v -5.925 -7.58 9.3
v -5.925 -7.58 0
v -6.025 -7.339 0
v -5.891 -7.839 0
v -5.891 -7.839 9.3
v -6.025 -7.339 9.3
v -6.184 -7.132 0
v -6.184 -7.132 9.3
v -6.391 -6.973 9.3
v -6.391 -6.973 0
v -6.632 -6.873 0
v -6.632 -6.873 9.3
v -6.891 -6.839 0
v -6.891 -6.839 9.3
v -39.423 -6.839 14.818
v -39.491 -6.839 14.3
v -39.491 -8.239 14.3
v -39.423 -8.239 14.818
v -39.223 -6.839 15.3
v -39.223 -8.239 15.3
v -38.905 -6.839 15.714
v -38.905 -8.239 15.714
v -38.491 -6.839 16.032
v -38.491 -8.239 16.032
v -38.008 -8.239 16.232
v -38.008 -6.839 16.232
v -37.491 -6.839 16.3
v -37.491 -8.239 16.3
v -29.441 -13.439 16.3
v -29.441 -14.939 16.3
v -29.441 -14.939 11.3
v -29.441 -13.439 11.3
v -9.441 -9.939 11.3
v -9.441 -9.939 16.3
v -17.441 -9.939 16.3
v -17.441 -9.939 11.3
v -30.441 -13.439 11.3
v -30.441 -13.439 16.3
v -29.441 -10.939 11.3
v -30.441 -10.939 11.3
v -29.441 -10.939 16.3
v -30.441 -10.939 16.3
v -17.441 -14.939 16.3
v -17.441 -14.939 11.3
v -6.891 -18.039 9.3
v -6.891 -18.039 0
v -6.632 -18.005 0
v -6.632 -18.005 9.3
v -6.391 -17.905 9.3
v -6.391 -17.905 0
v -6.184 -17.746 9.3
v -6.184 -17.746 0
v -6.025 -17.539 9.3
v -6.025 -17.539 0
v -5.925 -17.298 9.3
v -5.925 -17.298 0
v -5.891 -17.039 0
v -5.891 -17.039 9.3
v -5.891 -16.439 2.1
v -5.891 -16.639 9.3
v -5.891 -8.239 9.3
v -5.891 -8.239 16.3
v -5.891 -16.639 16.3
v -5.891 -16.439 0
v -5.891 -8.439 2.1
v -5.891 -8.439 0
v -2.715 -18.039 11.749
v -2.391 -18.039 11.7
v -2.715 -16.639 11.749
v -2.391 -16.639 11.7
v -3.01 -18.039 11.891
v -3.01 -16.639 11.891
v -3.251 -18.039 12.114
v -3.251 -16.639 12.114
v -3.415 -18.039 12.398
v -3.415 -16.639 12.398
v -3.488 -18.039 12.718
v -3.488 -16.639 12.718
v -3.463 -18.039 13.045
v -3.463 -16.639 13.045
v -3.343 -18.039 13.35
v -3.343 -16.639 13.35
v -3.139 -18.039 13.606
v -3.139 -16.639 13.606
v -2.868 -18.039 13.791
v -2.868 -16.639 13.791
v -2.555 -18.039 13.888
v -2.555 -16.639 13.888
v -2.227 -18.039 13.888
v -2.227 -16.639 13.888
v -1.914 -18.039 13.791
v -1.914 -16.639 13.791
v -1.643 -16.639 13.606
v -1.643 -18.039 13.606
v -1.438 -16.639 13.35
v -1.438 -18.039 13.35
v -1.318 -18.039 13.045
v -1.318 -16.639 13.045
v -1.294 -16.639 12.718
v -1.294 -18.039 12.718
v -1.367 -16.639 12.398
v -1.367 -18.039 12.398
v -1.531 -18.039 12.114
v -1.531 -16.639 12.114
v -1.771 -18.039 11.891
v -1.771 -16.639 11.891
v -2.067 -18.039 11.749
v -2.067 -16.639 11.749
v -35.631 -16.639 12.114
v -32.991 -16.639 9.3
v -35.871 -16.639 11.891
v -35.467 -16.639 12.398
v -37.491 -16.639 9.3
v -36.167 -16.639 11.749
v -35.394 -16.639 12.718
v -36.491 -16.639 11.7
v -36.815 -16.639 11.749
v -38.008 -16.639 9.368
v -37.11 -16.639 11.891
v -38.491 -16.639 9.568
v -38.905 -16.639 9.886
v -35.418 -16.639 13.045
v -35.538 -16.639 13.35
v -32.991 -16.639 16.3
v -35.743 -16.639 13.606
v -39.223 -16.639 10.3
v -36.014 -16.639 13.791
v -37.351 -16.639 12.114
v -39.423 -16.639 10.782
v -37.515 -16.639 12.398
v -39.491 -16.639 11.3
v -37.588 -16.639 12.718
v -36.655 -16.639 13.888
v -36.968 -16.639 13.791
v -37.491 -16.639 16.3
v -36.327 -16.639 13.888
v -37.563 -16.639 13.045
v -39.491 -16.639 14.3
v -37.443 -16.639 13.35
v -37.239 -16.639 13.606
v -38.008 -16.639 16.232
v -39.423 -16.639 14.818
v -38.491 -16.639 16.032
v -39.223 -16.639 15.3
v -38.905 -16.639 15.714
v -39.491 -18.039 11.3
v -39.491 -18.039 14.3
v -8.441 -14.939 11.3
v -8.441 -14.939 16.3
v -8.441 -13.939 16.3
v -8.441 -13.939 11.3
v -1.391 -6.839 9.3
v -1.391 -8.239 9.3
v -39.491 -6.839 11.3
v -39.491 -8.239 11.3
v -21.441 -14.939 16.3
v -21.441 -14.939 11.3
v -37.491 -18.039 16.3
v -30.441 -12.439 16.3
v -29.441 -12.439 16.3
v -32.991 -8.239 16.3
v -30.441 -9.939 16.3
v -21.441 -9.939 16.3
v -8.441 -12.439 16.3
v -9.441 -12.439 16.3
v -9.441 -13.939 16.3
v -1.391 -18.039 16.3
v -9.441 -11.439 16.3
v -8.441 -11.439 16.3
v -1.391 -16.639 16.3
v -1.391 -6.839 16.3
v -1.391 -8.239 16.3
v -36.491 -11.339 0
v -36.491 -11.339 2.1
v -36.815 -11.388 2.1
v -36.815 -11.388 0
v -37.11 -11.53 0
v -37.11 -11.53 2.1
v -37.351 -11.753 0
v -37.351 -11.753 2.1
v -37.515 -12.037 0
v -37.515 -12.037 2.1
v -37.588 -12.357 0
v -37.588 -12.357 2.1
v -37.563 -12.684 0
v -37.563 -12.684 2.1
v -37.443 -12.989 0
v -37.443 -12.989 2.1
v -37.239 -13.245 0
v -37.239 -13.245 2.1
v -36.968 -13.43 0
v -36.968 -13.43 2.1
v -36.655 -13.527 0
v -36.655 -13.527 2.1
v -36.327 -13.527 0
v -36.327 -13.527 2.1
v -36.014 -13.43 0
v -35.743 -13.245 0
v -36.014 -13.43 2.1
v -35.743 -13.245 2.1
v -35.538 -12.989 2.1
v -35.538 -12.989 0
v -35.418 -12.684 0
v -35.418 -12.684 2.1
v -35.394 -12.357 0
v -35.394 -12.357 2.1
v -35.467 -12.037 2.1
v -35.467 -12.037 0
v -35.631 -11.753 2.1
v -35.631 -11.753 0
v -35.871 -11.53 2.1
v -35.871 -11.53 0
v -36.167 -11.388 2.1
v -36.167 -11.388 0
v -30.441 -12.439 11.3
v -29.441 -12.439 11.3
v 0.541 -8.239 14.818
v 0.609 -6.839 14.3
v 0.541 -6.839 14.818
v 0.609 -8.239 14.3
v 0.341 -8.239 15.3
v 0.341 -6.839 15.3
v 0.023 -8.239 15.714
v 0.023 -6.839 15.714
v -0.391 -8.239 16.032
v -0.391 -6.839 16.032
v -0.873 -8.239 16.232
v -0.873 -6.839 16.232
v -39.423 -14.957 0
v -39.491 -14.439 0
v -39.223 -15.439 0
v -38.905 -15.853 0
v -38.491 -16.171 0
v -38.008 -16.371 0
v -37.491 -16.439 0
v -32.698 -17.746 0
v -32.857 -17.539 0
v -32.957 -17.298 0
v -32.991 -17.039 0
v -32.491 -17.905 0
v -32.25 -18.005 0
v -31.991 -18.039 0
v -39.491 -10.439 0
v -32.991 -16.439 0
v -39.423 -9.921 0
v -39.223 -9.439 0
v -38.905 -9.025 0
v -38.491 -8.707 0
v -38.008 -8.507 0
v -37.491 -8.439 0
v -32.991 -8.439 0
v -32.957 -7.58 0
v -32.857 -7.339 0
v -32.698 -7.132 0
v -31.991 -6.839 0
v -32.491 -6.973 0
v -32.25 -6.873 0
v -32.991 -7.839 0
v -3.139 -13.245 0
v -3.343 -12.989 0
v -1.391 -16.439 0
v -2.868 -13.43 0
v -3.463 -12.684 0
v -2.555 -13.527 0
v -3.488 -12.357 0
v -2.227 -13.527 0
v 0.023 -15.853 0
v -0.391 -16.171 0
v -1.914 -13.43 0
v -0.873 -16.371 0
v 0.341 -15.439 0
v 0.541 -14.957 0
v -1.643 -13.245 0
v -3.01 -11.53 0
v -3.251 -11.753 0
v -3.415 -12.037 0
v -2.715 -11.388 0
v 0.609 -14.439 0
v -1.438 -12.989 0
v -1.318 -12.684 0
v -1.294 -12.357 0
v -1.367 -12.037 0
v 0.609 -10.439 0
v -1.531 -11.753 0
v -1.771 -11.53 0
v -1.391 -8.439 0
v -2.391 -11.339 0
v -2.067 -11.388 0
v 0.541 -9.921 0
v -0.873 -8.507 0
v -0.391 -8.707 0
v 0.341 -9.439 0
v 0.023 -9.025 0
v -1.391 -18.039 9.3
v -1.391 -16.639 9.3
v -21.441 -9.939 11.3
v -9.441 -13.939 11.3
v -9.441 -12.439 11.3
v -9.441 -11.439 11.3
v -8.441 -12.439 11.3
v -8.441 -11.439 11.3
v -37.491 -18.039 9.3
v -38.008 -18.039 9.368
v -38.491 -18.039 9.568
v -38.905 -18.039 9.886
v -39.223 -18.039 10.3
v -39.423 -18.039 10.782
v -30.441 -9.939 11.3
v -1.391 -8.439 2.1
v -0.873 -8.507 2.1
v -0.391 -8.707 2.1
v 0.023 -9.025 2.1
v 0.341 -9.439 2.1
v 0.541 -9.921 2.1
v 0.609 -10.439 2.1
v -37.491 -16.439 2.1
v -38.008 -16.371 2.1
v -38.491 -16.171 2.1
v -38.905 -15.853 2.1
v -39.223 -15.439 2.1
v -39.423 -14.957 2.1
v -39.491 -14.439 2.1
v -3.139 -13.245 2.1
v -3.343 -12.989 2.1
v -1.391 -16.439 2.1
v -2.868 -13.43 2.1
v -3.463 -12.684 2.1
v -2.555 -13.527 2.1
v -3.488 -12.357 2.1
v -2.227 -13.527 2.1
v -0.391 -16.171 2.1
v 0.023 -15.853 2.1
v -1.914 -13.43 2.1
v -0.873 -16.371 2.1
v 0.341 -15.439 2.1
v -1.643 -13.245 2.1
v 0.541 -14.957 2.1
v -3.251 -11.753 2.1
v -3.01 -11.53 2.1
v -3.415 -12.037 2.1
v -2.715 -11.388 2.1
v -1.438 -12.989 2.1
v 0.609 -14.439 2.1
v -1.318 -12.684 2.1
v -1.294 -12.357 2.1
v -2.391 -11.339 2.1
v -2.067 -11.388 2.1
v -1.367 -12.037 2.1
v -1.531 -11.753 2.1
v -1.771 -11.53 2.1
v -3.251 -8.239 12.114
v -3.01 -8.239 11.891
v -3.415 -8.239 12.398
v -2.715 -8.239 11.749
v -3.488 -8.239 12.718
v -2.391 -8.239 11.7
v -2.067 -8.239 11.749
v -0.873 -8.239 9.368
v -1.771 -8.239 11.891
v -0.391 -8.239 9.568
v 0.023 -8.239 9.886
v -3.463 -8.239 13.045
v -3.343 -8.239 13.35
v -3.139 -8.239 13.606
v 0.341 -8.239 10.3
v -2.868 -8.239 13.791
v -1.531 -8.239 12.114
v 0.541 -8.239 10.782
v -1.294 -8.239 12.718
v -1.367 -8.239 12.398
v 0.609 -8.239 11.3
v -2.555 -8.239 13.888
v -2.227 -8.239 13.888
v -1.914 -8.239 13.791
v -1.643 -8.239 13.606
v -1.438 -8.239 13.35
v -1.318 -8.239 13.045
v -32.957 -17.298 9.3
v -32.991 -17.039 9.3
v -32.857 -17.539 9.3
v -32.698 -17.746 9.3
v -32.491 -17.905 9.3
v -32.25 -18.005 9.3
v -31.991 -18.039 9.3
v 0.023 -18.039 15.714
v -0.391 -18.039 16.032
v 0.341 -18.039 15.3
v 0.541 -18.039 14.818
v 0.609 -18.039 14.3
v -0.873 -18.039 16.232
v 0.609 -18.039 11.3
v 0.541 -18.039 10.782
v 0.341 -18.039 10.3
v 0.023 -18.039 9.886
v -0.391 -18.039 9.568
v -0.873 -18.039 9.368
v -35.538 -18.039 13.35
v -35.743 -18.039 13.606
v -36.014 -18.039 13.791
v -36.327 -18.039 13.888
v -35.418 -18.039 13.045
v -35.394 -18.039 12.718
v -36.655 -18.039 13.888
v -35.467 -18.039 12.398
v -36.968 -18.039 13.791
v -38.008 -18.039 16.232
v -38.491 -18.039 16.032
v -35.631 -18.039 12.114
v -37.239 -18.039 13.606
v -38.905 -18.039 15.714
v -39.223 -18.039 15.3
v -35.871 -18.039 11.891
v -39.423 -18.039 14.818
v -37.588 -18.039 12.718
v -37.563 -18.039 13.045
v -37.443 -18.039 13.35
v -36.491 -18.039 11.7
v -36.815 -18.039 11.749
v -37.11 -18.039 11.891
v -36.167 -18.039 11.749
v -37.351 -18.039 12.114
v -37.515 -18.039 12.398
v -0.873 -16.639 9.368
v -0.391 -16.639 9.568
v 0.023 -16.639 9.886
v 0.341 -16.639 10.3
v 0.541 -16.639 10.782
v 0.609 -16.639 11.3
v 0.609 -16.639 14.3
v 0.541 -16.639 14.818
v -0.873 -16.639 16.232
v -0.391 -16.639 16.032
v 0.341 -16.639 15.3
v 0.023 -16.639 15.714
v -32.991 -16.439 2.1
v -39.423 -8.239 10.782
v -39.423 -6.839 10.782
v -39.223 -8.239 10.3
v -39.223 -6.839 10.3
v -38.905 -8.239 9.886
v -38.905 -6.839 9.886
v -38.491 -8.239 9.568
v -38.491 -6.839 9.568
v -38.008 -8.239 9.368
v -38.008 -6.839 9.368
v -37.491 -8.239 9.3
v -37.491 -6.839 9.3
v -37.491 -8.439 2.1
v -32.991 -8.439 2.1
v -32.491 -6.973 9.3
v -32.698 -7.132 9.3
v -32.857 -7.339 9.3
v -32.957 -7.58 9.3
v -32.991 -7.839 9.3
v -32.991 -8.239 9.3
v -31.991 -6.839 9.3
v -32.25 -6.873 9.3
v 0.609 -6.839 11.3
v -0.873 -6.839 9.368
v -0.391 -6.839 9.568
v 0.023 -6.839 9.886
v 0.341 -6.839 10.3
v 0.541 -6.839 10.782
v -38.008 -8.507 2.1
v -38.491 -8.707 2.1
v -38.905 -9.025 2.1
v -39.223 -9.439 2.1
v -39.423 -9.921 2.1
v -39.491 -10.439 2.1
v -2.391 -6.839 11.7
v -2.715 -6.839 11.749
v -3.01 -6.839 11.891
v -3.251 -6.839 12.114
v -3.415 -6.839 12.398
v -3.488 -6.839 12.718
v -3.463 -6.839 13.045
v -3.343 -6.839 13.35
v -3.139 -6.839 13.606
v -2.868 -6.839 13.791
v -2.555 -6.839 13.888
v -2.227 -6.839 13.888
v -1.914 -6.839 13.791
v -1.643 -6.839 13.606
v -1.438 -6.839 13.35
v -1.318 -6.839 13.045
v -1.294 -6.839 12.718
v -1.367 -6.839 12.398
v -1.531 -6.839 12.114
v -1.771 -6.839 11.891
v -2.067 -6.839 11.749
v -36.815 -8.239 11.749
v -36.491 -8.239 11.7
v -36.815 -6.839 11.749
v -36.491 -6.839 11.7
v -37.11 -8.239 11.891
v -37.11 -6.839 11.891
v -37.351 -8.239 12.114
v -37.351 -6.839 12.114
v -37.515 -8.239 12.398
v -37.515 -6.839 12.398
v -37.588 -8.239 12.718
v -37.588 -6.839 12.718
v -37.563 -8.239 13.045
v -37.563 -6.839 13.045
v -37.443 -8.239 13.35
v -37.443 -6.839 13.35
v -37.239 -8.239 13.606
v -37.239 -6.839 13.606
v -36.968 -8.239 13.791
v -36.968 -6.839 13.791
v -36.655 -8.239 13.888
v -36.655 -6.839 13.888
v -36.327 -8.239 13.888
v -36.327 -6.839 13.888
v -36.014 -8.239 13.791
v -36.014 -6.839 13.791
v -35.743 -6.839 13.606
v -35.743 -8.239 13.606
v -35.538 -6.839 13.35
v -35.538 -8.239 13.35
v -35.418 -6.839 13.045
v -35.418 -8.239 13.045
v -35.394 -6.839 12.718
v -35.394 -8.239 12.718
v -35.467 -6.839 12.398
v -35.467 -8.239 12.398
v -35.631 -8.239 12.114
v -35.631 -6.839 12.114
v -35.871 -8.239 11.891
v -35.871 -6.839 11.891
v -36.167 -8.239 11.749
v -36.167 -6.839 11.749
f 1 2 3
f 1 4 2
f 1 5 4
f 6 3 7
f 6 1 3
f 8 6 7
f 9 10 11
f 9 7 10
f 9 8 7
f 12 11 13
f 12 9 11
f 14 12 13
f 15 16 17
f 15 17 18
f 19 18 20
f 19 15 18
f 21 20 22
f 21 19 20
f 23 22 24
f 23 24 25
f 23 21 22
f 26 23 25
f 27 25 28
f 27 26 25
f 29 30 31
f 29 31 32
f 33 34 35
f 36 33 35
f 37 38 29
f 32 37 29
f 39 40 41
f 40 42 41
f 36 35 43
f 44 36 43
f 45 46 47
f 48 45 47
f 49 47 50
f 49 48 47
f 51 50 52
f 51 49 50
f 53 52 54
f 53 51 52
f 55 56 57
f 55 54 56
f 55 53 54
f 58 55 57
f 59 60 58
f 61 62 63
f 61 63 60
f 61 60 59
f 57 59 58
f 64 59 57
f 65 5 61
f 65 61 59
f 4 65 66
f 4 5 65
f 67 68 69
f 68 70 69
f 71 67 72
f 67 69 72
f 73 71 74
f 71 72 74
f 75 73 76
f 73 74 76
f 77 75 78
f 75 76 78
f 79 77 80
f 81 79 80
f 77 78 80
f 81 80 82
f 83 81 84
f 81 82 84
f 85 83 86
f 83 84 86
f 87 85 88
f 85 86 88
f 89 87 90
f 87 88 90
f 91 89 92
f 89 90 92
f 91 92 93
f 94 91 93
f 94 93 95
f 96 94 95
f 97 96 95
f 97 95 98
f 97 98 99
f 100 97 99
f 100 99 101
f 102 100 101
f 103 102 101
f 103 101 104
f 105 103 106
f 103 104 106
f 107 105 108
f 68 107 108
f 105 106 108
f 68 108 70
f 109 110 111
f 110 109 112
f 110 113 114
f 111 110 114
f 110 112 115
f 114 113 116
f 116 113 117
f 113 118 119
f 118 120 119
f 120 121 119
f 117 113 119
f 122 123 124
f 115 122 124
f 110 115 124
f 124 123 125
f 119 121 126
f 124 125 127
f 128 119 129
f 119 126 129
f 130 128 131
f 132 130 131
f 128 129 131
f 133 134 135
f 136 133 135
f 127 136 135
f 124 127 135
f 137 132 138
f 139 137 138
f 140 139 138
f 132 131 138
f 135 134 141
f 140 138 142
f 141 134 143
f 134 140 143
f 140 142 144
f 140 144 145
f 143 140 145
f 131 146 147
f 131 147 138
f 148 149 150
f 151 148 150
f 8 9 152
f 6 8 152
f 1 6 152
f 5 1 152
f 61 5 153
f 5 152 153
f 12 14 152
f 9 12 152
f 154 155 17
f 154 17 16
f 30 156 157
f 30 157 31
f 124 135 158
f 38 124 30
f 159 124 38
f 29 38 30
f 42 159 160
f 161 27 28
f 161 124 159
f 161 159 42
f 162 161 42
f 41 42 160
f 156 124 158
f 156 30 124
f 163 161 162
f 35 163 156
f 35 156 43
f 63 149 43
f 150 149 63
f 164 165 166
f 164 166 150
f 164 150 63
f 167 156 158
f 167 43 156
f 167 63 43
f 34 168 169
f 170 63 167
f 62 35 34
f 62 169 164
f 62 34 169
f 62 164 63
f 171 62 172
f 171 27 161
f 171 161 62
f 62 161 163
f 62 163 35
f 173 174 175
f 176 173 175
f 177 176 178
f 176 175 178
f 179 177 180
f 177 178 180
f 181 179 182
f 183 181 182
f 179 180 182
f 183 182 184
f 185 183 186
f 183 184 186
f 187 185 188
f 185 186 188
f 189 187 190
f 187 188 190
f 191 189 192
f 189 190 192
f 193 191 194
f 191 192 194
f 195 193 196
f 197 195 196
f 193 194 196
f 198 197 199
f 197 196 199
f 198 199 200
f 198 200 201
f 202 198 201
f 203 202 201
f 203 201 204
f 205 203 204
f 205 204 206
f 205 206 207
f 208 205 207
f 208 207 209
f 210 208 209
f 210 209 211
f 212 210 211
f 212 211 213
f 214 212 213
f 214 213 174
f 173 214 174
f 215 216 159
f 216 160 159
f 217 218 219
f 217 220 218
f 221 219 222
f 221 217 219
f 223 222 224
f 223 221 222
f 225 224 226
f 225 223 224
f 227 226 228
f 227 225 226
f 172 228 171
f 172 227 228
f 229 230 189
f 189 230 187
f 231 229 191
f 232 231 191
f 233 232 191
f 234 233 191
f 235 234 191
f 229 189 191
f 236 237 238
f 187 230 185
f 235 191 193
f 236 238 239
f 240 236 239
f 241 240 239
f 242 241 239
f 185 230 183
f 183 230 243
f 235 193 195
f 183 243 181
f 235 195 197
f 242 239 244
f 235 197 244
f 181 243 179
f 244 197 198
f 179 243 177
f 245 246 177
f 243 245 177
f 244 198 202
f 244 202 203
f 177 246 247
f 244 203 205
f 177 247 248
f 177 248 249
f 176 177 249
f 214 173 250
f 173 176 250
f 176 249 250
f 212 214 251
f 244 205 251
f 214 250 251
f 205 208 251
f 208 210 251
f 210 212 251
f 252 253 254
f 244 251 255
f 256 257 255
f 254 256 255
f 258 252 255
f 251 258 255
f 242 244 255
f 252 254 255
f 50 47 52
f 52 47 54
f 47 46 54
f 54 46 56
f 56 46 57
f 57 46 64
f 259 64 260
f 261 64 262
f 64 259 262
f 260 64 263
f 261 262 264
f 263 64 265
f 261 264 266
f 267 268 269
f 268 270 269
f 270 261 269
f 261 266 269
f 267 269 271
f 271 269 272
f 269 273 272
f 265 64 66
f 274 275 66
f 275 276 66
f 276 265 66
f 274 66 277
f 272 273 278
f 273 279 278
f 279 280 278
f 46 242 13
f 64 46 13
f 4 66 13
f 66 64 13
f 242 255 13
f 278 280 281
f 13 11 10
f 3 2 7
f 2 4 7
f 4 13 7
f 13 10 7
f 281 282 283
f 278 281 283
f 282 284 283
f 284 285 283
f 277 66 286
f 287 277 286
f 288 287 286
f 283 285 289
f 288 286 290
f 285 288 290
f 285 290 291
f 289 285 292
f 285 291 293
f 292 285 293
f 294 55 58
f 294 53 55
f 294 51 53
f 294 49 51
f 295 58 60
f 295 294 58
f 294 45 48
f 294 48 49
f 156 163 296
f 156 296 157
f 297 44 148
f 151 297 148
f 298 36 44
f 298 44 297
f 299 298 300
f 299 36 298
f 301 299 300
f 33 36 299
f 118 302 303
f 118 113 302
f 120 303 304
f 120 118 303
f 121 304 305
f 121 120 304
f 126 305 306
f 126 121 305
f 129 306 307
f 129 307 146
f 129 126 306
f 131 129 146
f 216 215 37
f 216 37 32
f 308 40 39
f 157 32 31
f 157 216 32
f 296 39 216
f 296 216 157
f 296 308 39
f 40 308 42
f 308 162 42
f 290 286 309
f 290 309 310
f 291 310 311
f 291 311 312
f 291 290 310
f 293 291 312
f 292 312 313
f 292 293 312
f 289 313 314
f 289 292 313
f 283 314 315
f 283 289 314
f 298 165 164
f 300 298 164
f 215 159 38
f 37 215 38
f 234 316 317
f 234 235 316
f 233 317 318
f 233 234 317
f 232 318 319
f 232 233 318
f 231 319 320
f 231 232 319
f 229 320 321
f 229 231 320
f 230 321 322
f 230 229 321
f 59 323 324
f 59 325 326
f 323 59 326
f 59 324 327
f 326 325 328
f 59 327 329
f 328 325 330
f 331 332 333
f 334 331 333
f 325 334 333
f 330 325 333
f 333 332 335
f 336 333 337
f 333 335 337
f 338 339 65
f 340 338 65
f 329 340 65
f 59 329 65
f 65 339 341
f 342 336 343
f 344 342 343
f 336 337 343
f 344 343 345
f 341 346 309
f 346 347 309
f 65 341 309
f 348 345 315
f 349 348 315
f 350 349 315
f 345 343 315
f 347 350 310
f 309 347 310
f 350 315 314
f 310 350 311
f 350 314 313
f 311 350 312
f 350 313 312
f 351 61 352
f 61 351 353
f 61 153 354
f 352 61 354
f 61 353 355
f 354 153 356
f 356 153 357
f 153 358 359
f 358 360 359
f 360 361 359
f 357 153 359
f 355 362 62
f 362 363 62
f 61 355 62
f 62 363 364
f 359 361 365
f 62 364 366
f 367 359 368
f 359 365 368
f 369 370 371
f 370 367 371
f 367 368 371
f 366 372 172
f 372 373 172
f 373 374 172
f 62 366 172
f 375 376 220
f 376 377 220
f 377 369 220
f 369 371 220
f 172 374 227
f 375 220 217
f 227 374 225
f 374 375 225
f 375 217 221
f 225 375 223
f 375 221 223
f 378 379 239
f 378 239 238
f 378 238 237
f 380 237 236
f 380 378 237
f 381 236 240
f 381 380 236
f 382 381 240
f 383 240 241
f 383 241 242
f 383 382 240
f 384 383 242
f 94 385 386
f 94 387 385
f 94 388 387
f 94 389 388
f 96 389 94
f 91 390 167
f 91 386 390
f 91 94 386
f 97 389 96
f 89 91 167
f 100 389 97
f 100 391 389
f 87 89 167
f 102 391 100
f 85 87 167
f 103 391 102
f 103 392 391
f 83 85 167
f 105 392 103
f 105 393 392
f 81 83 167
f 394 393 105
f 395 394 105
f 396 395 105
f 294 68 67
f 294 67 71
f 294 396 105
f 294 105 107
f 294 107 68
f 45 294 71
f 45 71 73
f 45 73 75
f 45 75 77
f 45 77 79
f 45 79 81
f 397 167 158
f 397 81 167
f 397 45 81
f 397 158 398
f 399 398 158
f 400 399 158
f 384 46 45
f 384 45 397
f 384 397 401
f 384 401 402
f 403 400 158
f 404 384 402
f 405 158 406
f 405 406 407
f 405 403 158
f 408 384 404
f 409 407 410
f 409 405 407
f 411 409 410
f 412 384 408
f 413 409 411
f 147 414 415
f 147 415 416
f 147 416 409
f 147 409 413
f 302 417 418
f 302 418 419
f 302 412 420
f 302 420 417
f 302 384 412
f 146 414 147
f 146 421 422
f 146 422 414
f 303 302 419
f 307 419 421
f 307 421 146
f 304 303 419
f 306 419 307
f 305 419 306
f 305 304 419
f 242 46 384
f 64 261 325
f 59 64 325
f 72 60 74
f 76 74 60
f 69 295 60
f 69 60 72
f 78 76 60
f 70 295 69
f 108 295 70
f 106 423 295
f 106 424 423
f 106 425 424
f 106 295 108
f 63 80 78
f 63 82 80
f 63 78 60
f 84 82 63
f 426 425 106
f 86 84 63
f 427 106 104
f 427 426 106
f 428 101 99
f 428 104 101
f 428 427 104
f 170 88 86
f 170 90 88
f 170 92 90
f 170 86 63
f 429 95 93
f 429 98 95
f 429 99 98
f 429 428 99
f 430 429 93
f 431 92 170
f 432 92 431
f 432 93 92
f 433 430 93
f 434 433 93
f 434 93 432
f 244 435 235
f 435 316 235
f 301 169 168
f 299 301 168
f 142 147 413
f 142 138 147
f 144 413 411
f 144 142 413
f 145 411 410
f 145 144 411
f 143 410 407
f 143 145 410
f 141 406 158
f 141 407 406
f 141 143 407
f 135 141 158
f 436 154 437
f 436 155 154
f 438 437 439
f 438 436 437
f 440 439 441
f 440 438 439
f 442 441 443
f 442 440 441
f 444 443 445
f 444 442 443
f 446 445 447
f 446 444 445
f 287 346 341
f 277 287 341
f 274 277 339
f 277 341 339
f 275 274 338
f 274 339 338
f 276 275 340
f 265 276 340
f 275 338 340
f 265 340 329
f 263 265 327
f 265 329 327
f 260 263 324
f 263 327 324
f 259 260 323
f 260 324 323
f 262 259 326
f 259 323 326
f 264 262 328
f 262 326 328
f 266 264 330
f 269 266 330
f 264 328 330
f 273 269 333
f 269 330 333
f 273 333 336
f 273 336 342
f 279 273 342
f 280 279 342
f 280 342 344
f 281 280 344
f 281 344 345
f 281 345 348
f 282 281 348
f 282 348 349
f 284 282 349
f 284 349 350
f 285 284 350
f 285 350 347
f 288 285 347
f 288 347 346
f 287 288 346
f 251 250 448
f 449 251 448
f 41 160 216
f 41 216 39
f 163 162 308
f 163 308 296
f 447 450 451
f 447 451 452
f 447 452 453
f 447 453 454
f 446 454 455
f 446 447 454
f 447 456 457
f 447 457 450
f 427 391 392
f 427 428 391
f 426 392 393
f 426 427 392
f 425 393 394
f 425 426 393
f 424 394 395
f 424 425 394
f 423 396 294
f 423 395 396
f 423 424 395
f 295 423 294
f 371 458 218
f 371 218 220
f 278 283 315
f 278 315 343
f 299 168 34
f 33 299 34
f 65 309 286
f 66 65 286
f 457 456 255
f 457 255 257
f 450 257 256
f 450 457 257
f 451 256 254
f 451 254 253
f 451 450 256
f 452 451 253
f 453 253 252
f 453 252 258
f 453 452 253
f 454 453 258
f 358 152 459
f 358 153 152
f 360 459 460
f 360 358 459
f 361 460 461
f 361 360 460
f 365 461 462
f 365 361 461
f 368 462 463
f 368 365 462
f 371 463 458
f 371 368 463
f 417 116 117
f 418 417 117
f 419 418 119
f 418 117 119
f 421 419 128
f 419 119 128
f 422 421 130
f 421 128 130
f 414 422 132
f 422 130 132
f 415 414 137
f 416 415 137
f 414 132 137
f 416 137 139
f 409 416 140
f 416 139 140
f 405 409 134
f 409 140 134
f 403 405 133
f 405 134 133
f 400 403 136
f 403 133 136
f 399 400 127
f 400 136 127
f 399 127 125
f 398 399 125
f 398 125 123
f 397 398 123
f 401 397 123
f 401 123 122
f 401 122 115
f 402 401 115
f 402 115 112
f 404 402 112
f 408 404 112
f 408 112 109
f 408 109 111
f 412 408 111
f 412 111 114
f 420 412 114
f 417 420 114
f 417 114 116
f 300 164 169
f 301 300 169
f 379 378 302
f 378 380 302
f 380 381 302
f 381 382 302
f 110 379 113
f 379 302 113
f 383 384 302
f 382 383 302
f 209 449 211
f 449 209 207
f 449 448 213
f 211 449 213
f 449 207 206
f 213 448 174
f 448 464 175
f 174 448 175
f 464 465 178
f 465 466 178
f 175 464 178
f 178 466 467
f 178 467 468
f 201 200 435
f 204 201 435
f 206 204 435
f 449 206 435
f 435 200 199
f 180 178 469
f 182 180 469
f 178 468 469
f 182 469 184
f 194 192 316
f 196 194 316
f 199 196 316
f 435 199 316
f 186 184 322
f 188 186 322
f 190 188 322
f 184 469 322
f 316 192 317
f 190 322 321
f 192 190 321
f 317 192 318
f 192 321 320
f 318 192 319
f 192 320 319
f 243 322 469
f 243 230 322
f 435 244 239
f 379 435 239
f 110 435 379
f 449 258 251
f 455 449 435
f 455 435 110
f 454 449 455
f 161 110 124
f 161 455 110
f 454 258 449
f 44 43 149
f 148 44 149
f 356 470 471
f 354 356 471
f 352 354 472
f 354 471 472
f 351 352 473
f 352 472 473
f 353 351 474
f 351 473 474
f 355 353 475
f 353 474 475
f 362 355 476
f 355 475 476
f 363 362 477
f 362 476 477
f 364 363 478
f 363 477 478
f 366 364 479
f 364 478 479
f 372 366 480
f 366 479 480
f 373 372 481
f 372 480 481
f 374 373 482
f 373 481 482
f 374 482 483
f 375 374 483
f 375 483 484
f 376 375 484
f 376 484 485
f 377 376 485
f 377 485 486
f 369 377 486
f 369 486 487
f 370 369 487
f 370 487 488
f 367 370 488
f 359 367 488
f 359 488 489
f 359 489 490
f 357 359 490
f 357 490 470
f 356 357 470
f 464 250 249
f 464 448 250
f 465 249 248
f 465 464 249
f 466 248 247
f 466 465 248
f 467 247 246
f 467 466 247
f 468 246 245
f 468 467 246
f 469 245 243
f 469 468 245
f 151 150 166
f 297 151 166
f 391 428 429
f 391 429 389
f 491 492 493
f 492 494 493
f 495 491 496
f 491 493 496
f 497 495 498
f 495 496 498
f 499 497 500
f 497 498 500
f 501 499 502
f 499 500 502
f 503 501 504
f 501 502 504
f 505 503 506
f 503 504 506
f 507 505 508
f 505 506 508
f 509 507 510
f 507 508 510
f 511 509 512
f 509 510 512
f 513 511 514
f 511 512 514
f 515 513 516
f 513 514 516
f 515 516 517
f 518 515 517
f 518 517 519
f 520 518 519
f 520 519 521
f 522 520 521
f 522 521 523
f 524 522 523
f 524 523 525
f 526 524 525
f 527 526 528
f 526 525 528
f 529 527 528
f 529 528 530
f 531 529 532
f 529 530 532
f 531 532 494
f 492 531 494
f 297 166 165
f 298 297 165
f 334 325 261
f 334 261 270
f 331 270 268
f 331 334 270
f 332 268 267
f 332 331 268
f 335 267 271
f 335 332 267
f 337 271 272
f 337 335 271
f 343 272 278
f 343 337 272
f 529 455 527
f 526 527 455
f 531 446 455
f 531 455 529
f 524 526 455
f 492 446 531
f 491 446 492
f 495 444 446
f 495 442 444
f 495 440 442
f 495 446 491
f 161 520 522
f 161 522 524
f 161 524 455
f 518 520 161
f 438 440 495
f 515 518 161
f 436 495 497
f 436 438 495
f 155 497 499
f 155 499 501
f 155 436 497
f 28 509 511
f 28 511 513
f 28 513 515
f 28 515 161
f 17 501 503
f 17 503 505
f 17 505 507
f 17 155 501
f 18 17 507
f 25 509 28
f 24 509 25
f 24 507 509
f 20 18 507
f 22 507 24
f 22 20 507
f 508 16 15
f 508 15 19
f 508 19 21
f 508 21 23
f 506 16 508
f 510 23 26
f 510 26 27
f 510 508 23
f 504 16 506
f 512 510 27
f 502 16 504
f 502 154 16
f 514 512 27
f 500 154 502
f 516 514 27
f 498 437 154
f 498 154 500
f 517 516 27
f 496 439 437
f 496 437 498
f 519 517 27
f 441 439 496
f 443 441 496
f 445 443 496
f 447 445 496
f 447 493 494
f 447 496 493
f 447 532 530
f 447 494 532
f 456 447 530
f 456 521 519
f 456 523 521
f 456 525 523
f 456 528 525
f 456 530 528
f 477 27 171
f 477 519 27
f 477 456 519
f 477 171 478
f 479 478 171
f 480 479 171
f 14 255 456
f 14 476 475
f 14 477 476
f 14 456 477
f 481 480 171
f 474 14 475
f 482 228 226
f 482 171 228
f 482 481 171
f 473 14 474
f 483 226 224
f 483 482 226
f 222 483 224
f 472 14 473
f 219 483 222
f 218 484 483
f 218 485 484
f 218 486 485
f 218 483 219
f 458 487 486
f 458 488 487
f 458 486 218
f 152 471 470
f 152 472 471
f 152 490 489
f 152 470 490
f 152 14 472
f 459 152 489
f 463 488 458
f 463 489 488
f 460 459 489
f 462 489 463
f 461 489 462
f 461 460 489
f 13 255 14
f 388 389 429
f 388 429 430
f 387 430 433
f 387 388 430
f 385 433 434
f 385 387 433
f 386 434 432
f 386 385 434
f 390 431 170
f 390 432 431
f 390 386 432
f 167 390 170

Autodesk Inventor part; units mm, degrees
ref_plane "YZ Plane" through (0, 0, 0) normal (1, 0, 0) x (0, 1, 0)
ref_plane "XZ Plane" through (0, 0, 0) normal (0, 1, 0) x (-1, 0, 0)
ref_plane "XY Plane" through (0, 0, 0) normal (0, 0, 1) x (1, 0, 0)
sketch "スケッチ1" plane through (0, 0, 0) normal (0, 0, 1) x (1, 0, 0)
  line L0 (-39.4908, -6.839) -> (0.6092, -6.839)
  line L1 (0.6092, -6.839) -> (0.6092, -18.039)
  line L2 (0.6092, -18.039) -> (-39.4908, -18.039)
  line L3 (-39.4908, -18.039) -> (-39.4908, -6.839)
  point P0 (0, 0)
  dimension "d0" = 40.1
  dimension "d1" = 11.2
extrude "押し出し1" add sketch "スケッチ1" along normal blind 16.3
sketch "スケッチ2" plane through (0.6092, -18.039, 0) normal (1, 0, 0) x (0, 0, -1)
  line L0 (-16.3, 11.2) -> (-16.3, 0) projected
  line L1 (0, 0) -> (-16.3, 0) projected
  line L2 (0, 11.2) -> (0, 0) projected
  line L3 (0, 11.2) -> (-16.3, 11.2) projected
  line L4 (-16.3, 0) -> (-9.3, 0)
  line L5 (-9.3, 0) -> (-9.3, 1.4)
  line L6 (-9.3, 1.4) -> (-16.3, 1.4)
  line L7 (-16.3, 1.4) -> (-16.3, 0)
  line L8 (-16.3, 11.2) -> (-9.3, 11.2)
  line L9 (-9.3, 11.2) -> (-9.3, 9.8)
  line L10 (-9.3, 9.8) -> (-16.3, 9.8)
  line L11 (-16.3, 9.8) -> (-16.3, 11.2)
  line L12 (0, 1.6) -> (-2.1, 1.6)
  line L13 (-2.1, 1.6) -> (-2.1, 9.6)
  line L14 (-2.1, 9.6) -> (0, 9.6)
  line L15 (0, 9.6) -> (0, 1.6)
  point P0 (0, 18.039)
  dimension "d4" = 8
  dimension "d5" = 2.1
  dimension "d6" = 7
  dimension "d7" = 7
  dimension "d8" = 8.4
extrude "押し出し2" cut sketch "スケッチ2" against normal blind 6.5 contours L10 L9 L3 L2 L14 L13 L12 L1 L5 L6 L0
sketch "スケッチ3" plane through (-39.4908, -18.039, 0) normal (-1, 0, 0) x (0, 0, 1)
  line L0 (16.3, 0) -> (16.3, 11.2) projected
  line L1 (0, 11.2) -> (16.3, 11.2) projected
  line L2 (0, 0) -> (0, 11.2) projected
  line L3 (0, 0) -> (16.3, 0) projected
  line L4 (16.3, 11.2) -> (9.3, 11.2)
  line L5 (9.3, 11.2) -> (9.3, 9.8)
  line L6 (9.3, 9.8) -> (16.3, 9.8)
  line L7 (16.3, 9.8) -> (16.3, 11.2)
  line L8 (16.3, 0) -> (9.3, 0)
  line L9 (9.3, 0) -> (9.3, 1.4)
  line L10 (9.3, 1.4) -> (16.3, 1.4)
  line L11 (16.3, 1.4) -> (16.3, 0)
  line L12 (0, 9.6) -> (2.1, 9.6)
  line L13 (2.1, 9.6) -> (2.1, 1.6)
  line L14 (2.1, 1.6) -> (0, 1.6)
  line L15 (0, 1.6) -> (0, 9.6)
  line L16 (2.1, 5.6) -> (16.3, 5.6)
  point P0 (0, 18.039)
  dimension "d12" = 7
  dimension "d13" = 7
  dimension "d14" = 8
  dimension "d15" = 2.1
  dimension "d16" = 8.4
  dimension "d17" = 4.2
extrude "押し出し3" cut sketch "スケッチ3" against normal blind 6.5 contours L10 L9 L3 L2 L14 L13 L16 L0 | L16 L13 L12 L2 L1 L5 L6 L0
sketch "スケッチ4" plane through (0, 0, 0) normal (0, 0, -1) x (-1, 0, 0)
  line L0 (5.8908, -18.039) -> (32.9908, -18.039) projected
  line L1 (39.4908, -8.439) -> (32.9908, -8.439) projected
  line L2 (36.4908, -12.439) -> (2.3908, -12.439)
  line L3 (19.4408, -12.439) -> (19.4408, -18.039)
  point P0 (0, 0)
  dimension "d20" = 34.1
  dimension "d21" = 5.6
hole "穴1" at (-36.4908, -12.439, 0) at (-2.3908, -12.439, 0) direction (0, 0, 1) diameter 2.2 end through all
sketch "スケッチ5" plane through (-39.4908, -18.039, 16.3) normal (0, -1, 0) x (1, 0, 0)
  line L0 (33.6, -16.3) -> (6.5, -16.3) projected
  line L1 (40.1, -7) -> (40.1, 0) projected
  line L2 (40.1, 0) -> (0, 0) projected
  line L3 (3, -3.5) -> (37.1, -3.5)
  line L4 (20.05, -3.5) -> (20.05, 0)
  point P0 (39.4908, -16.3)
  dimension "d29" = 34.1
  dimension "d30" = 12.8
hole "穴2" at (-36.4908, -18.039, 12.8) at (-2.3908, -18.039, 12.8) direction (0, 1, 0) diameter 2.2 end through all
fillet "フィレット1" radius 2 12 edges at (0.6092, -17.339, 16.3) (0.6092, -17.339, 9.3) (0.6092, -7.539, 16.3) (0.6092, -7.539, 9.3) (-39.4908, -7.539, 16.3) (-39.4908, -17.339, 16.3) (-39.4908, -17.339, 9.3) (-39.4908, -7.539, 9.3) (0.6092, -16.439, 1.05) (0.6092, -8.439, 1.05) (-39.4908, -16.439, 1.05) (-39.4908, -8.439, 1.05)
fillet "フィレット2" radius 1 4 edges at (-32.9908, -18.039, 4.65) (-5.8908, -18.039, 4.65) (-5.8908, -6.839, 4.65) (-32.9908, -6.839, 4.65)
sketch "スケッチ6" plane through (0, 0, 16.3) normal (0, 0, 1) x (1, 0, 0)
  line L0 (-29.4408, -9.939) -> (-21.4408, -9.939)
  line L1 (-21.4408, -9.939) -> (-21.4408, -14.939)
  line L2 (-21.4408, -14.939) -> (-29.4408, -14.939)
  line L3 (-9.4408, -9.939) -> (-17.4408, -9.939)
  line L4 (-17.4408, -9.939) -> (-17.4408, -14.939)
  line L5 (-17.4408, -14.939) -> (-9.4408, -14.939)
  line L6 (-29.4408, -9.939) -> (-30.4408, -9.939)
  line L7 (-30.4408, -9.939) -> (-30.4408, -10.939)
  line L8 (-30.4408, -10.939) -> (-29.4408, -10.939)
  line L9 (-29.4408, -12.439) -> (-30.4408, -12.439)
  line L10 (-30.4408, -12.439) -> (-30.4408, -13.439)
  line L11 (-30.4408, -13.439) -> (-29.4408, -13.439)
  line L12 (-9.4408, -14.939) -> (-8.4408, -14.939)
  line L13 (-8.4408, -14.939) -> (-8.4408, -13.939)
  line L14 (-8.4408, -13.939) -> (-9.4408, -13.939)
  line L15 (-9.4408, -12.439) -> (-8.4408, -12.439)
  line L16 (-8.4408, -12.439) -> (-8.4408, -11.439)
  line L17 (-8.4408, -11.439) -> (-9.4408, -11.439)
  line L18 (-29.4408, -14.939) -> (-29.4408, -13.439)
  line L19 (-29.4408, -12.439) -> (-29.4408, -10.939)
  line L20 (-9.4408, -13.939) -> (-9.4408, -12.439)
  line L21 (-9.4408, -11.439) -> (-9.4408, -9.939)
  point P0 (0, 0)
  dimension "d41" = 5
  dimension "d43" = 1
  dimension "d46" = 1
  dimension "d47" = 1
  dimension "d50" = 1
extrude "押し出し4" cut sketch "スケッチ6" against normal blind 5
properties part number "TB-22PP" material "ABS Plastic"
